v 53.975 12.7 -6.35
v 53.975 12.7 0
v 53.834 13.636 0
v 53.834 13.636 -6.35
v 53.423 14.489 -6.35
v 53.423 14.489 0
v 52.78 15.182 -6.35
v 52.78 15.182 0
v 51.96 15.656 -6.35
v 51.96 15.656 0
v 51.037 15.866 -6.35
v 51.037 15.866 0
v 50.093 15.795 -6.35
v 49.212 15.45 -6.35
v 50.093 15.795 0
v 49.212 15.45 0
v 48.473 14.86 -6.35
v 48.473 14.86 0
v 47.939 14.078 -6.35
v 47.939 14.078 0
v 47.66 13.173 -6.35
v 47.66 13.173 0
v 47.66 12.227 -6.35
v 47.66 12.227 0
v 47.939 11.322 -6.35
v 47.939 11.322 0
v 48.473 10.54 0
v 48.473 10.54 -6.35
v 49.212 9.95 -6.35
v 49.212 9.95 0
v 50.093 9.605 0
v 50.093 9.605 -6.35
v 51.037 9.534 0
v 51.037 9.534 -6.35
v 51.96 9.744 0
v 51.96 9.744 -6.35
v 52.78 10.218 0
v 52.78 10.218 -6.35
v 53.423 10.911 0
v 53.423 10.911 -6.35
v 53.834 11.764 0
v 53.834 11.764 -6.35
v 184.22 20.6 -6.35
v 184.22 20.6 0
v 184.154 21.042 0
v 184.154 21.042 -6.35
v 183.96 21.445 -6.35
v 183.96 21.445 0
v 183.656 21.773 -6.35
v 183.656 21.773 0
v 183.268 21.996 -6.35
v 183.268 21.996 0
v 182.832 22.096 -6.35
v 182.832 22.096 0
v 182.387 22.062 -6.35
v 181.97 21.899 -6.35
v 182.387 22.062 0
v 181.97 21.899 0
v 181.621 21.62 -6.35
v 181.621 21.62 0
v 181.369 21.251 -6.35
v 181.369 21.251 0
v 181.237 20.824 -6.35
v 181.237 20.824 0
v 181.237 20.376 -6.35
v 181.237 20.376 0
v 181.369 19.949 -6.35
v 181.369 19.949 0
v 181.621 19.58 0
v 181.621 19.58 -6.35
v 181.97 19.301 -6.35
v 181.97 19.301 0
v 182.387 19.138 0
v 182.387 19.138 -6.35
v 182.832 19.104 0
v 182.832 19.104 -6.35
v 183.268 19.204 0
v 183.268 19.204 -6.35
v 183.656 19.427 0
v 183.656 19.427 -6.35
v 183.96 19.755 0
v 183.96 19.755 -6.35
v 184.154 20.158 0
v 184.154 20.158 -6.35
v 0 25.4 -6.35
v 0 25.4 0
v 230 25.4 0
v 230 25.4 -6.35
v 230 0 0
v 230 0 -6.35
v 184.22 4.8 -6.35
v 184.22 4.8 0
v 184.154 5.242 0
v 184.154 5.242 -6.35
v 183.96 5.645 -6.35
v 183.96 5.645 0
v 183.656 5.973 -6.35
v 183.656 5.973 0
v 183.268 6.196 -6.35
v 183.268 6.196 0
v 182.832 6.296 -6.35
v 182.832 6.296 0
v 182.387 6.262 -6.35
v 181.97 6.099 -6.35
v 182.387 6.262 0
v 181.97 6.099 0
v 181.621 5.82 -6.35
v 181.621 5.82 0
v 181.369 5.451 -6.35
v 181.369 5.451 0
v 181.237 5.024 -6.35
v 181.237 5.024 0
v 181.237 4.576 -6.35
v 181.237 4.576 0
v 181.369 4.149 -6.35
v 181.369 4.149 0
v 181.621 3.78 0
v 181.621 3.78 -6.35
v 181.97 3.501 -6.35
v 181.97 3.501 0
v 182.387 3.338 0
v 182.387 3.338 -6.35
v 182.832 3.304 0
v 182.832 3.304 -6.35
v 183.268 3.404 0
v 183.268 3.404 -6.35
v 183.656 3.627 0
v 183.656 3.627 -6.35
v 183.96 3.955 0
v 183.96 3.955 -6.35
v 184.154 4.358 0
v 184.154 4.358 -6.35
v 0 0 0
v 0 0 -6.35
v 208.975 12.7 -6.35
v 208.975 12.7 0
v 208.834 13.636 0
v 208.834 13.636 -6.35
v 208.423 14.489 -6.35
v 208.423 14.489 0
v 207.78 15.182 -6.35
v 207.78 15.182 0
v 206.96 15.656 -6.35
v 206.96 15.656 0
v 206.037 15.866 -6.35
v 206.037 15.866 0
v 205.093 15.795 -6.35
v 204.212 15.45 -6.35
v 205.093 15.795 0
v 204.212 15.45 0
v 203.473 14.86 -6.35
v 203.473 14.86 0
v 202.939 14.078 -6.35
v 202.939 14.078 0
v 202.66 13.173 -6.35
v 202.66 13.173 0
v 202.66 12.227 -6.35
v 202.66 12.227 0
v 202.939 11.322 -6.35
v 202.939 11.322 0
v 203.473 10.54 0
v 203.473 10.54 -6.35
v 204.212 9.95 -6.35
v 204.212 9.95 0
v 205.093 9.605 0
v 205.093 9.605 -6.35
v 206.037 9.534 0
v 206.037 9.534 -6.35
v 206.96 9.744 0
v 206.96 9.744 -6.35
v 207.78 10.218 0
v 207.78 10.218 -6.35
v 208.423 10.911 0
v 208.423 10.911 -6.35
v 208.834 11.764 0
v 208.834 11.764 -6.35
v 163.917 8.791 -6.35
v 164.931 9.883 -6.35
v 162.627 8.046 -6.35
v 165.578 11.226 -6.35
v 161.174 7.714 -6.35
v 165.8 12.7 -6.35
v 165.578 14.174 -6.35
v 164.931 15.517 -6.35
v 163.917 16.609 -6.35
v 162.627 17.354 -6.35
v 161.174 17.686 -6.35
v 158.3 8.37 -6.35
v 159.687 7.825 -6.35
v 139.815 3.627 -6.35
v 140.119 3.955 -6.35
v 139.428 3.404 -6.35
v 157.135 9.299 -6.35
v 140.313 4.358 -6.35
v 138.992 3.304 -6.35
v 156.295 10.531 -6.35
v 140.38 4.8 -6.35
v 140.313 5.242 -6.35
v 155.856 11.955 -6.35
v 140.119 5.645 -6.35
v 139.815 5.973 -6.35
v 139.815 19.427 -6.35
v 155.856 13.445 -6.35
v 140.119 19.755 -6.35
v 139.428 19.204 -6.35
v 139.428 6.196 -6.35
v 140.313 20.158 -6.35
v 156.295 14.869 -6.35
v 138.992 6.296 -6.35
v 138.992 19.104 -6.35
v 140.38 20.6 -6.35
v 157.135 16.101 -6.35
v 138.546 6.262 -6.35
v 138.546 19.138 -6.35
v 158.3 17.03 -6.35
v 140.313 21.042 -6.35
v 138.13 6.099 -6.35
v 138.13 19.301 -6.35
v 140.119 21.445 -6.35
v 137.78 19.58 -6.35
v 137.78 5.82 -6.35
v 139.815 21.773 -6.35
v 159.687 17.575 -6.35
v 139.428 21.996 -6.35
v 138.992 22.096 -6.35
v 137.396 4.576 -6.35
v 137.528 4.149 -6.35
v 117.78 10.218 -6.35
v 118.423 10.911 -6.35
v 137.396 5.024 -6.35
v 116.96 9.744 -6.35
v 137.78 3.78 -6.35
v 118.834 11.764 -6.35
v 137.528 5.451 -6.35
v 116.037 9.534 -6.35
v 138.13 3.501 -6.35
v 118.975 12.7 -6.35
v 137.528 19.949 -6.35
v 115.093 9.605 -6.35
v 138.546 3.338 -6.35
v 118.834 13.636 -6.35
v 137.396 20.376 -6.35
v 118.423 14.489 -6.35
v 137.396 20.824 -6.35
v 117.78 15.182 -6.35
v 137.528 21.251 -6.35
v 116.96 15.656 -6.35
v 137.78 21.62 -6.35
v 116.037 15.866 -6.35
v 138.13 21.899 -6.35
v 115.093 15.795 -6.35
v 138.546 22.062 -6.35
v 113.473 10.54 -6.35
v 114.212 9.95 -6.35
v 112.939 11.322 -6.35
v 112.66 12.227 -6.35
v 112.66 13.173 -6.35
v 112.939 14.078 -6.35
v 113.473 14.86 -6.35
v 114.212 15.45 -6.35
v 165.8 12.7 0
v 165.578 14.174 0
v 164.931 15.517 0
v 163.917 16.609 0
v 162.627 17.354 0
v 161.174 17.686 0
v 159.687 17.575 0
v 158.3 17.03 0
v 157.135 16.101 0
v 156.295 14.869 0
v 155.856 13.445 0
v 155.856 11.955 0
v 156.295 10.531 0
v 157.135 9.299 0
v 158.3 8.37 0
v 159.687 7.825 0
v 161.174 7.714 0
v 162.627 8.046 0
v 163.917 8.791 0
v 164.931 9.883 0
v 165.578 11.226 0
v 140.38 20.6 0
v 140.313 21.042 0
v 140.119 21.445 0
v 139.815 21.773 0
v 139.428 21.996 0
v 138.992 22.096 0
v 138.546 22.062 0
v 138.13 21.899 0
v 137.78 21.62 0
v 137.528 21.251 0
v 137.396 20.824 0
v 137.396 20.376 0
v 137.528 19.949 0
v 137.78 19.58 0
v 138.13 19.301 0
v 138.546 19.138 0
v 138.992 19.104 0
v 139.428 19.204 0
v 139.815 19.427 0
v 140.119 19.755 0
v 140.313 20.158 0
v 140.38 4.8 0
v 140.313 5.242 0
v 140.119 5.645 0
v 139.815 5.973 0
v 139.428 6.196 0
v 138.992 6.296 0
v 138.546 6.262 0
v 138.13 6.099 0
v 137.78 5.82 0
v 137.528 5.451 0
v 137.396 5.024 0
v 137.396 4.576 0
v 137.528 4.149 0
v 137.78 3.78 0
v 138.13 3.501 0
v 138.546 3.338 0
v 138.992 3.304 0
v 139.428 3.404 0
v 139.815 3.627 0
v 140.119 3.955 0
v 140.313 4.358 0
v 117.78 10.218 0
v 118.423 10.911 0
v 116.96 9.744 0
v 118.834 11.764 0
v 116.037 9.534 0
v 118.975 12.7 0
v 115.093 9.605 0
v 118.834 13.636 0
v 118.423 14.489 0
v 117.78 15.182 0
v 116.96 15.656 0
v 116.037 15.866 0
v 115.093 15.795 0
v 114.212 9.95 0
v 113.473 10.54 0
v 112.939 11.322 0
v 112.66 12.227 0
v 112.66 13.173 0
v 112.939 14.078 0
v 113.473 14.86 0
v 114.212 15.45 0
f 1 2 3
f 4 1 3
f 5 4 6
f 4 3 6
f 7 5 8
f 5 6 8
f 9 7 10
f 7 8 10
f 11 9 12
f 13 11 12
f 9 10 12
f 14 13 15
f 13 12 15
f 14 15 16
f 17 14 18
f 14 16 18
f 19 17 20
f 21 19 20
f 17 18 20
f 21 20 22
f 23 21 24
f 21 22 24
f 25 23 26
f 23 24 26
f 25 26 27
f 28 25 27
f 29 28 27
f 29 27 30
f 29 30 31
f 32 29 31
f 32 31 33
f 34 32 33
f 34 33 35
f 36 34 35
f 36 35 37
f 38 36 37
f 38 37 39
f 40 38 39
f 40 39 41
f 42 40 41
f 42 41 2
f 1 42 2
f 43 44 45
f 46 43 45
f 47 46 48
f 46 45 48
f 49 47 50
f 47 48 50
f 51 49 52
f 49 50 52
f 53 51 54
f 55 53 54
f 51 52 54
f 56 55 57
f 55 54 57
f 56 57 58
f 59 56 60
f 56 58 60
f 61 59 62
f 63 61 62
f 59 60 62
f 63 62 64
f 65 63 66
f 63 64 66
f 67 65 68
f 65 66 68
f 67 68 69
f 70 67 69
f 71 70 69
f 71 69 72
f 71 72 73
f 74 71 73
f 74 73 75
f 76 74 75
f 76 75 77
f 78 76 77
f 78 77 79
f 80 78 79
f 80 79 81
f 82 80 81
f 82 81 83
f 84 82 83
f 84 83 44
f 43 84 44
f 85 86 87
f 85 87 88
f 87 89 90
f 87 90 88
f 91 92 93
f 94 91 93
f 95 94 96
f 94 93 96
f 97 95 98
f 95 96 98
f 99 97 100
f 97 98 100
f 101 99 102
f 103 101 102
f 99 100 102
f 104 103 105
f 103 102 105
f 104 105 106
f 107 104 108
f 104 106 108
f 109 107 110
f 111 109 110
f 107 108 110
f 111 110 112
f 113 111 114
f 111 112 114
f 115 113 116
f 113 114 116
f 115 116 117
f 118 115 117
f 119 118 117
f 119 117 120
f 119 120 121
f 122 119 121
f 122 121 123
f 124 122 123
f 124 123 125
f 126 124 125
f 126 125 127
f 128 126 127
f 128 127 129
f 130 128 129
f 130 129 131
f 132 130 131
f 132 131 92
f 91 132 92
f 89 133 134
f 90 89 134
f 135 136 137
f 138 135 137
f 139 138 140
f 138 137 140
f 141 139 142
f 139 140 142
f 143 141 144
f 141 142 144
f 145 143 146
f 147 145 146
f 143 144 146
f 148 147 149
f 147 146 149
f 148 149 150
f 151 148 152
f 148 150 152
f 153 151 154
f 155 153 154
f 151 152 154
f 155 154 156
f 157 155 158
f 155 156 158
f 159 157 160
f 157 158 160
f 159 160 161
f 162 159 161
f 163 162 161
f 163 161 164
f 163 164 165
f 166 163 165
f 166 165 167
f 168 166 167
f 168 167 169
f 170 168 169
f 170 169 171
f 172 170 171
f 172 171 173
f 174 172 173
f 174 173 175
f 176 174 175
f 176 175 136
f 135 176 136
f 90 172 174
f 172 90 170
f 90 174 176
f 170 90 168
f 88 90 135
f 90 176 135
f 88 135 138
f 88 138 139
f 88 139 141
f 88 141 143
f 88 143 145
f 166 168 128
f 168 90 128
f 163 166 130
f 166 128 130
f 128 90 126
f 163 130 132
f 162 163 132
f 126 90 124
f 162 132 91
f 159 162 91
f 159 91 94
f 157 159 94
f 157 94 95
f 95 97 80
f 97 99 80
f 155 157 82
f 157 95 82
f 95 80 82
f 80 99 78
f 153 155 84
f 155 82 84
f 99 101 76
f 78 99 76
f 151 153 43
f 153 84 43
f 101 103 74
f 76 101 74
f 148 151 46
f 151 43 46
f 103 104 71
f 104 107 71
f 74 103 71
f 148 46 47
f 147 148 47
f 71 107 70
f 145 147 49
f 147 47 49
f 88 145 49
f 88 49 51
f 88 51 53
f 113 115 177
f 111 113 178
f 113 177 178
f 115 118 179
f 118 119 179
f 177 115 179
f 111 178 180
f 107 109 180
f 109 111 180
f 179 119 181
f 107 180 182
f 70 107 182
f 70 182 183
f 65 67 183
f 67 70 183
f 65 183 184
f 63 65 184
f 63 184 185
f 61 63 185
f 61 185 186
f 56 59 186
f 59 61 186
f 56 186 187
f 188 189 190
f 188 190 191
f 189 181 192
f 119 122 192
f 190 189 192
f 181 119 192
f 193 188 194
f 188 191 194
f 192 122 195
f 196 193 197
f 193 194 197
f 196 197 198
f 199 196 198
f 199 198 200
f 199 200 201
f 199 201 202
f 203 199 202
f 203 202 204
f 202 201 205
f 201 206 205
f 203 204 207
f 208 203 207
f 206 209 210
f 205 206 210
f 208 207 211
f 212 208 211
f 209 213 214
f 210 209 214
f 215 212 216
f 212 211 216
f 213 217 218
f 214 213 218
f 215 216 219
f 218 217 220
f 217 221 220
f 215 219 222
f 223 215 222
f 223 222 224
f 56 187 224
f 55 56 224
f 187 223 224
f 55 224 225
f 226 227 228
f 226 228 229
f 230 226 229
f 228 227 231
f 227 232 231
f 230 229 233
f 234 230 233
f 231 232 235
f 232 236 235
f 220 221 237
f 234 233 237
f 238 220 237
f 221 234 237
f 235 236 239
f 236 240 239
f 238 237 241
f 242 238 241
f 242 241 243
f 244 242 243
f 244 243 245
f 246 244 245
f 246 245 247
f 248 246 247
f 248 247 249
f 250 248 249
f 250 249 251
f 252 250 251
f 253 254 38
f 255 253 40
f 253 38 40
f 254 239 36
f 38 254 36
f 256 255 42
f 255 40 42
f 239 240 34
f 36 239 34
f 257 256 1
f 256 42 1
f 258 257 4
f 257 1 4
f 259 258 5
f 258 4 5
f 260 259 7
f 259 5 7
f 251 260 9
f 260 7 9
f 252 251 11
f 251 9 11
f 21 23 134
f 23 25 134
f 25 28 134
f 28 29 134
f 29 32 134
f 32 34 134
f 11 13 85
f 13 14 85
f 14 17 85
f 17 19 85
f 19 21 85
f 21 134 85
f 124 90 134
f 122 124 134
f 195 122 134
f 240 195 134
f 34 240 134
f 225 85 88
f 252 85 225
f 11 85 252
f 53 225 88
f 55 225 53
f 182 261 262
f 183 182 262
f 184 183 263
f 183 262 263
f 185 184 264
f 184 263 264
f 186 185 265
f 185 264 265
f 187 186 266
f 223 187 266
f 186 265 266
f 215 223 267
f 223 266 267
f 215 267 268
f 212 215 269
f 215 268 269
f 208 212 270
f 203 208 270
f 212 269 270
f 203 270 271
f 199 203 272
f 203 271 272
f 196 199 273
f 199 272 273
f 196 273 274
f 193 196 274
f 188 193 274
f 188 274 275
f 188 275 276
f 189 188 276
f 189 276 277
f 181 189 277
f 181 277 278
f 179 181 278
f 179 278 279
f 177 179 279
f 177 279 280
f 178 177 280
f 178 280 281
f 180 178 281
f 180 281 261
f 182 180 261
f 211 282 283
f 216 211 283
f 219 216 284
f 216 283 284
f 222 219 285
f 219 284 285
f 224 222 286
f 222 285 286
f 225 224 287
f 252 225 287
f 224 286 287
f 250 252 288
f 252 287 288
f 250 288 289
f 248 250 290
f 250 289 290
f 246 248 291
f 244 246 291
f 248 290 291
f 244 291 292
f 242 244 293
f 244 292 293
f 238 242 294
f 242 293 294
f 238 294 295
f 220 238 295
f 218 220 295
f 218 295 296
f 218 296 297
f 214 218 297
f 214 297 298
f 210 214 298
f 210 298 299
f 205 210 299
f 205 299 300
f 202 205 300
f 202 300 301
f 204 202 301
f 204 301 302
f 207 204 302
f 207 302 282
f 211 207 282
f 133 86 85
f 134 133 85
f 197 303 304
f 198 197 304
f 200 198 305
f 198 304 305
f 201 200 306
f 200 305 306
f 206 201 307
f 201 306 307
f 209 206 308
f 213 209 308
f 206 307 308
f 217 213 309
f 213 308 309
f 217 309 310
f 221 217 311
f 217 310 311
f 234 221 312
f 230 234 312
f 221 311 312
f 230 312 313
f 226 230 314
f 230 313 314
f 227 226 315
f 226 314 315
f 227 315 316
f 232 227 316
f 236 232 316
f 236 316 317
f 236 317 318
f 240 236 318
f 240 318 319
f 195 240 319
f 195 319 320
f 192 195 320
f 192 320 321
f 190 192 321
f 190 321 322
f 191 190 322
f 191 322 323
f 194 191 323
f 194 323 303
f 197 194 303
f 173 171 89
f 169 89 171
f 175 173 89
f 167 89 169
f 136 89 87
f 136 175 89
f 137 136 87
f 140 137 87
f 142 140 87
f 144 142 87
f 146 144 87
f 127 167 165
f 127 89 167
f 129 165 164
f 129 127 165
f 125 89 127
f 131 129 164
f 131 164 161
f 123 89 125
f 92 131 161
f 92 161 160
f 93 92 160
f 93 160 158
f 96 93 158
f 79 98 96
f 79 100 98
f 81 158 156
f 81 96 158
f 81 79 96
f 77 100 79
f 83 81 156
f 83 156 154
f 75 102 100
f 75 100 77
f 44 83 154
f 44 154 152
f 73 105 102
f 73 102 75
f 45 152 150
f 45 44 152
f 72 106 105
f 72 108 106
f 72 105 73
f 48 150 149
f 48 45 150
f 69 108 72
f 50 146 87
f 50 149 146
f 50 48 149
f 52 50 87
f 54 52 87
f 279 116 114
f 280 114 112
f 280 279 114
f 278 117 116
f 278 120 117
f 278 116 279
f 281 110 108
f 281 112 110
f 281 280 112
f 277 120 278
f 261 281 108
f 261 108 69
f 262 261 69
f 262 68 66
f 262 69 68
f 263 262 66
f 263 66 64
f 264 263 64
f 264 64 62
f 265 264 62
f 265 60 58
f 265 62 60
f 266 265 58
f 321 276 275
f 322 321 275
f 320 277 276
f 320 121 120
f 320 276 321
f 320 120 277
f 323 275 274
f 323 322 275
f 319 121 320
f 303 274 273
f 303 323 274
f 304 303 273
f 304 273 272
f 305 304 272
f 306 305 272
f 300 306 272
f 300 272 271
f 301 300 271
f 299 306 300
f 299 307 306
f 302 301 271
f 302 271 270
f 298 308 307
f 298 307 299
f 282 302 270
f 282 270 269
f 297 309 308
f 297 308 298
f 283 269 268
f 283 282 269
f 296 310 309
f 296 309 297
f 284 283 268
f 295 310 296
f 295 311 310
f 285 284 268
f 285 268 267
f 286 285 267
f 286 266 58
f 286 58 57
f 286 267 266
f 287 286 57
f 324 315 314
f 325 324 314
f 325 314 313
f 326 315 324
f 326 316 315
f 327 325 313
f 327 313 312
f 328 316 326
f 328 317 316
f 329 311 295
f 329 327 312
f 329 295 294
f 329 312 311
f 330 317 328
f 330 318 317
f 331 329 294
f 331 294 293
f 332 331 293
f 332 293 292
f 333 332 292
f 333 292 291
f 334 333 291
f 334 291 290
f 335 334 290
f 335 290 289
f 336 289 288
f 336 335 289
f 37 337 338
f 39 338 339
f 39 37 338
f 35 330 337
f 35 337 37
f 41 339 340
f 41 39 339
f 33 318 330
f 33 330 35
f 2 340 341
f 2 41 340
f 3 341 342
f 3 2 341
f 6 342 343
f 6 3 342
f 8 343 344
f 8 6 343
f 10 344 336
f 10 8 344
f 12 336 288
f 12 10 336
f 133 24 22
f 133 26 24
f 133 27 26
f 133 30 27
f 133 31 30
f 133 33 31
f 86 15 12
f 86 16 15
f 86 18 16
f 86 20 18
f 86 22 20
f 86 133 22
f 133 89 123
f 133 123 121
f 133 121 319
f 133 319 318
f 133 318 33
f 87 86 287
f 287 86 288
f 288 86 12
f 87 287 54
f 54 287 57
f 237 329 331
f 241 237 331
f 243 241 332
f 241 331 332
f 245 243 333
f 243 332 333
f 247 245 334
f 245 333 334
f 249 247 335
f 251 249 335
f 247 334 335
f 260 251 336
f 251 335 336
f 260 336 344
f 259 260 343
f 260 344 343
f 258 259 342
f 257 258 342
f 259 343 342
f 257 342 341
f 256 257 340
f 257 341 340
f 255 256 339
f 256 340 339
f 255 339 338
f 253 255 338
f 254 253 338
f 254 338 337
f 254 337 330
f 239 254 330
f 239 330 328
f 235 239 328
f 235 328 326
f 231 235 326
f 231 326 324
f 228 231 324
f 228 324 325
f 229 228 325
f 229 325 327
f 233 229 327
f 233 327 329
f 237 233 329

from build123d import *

# Parameters (mm, degrees)
SKETCH1_W           = 6.35
SKETCH1_H           = 25.4
BOSS_EXTRUDE1_DEPTH = 304.8
SKETCH2_R           = 5
SKETCH2_R_2         = 3.175
CUT_EXTRUDE1_DEPTH  = 306.922412549
SKETCH4_R           = 1.5
CUT_EXTRUDE2_DEPTH  = 306.922412549
SKETCH5_R           = 3.175
CUT_EXTRUDE3_DEPTH  = 306.922412549
SKETCH6_W           = 74.8
SKETCH6_H           = 25.4
CUT_EXTRUDE5_DEPTH  = 10


with BuildPart() as part:
    # Sketch1 → Boss-Extrude1 (new body)
    with BuildSketch(Plane(origin=(0, 0, 0), x_dir=(0, 0, -1), z_dir=(1, 0, 0))):
        with Locations((3.175, 12.7)):
            Rectangle(SKETCH1_W, SKETCH1_H)
    extrude(amount=BOSS_EXTRUDE1_DEPTH)

    # Sketch2 → Cut-Extrude1 (cut, through all)
    with BuildSketch(Plane.XY):
        with Locations((160.8, 12.7)):
            Circle(SKETCH2_R)
        with Locations((50.8, 12.7)):
            Circle(SKETCH2_R_2)
        with Locations((115.8, 12.7)):
            Circle(SKETCH2_R_2)
        with Locations((205.8, 12.7)):
            Circle(SKETCH2_R_2)
    extrude(amount=-CUT_EXTRUDE1_DEPTH, mode=Mode.SUBTRACT)

    # Sketch4 → Cut-Extrude2 (cut, through all)
    with BuildSketch(Plane.XY):
        with Locations((138.879689783, 20.6)):
            Circle(SKETCH4_R)
        with Locations((182.720310217, 20.6)):
            Circle(SKETCH4_R)
        with Locations((182.720310217, 4.8)):
            Circle(SKETCH4_R)
        with Locations((138.879689783, 4.8)):
            Circle(SKETCH4_R)
    extrude(amount=-CUT_EXTRUDE2_DEPTH, mode=Mode.SUBTRACT)

    # Sketch5 → Cut-Extrude3 (cut, through all)
    with BuildSketch(Plane.XY):
        with Locations((241.3, 12.7)):
            Circle(SKETCH5_R)
        with Locations((292.1, 12.7)):
            Circle(SKETCH5_R)
    extrude(amount=-CUT_EXTRUDE3_DEPTH, mode=Mode.SUBTRACT)

    # Sketch6 → Cut-Extrude5 (cut)
    with BuildSketch(Plane.XY):
        with Locations((267.4, 12.7)):
            Rectangle(SKETCH6_W, SKETCH6_H)
    extrude(amount=-CUT_EXTRUDE5_DEPTH, mode=Mode.SUBTRACT)


solid = part.part
